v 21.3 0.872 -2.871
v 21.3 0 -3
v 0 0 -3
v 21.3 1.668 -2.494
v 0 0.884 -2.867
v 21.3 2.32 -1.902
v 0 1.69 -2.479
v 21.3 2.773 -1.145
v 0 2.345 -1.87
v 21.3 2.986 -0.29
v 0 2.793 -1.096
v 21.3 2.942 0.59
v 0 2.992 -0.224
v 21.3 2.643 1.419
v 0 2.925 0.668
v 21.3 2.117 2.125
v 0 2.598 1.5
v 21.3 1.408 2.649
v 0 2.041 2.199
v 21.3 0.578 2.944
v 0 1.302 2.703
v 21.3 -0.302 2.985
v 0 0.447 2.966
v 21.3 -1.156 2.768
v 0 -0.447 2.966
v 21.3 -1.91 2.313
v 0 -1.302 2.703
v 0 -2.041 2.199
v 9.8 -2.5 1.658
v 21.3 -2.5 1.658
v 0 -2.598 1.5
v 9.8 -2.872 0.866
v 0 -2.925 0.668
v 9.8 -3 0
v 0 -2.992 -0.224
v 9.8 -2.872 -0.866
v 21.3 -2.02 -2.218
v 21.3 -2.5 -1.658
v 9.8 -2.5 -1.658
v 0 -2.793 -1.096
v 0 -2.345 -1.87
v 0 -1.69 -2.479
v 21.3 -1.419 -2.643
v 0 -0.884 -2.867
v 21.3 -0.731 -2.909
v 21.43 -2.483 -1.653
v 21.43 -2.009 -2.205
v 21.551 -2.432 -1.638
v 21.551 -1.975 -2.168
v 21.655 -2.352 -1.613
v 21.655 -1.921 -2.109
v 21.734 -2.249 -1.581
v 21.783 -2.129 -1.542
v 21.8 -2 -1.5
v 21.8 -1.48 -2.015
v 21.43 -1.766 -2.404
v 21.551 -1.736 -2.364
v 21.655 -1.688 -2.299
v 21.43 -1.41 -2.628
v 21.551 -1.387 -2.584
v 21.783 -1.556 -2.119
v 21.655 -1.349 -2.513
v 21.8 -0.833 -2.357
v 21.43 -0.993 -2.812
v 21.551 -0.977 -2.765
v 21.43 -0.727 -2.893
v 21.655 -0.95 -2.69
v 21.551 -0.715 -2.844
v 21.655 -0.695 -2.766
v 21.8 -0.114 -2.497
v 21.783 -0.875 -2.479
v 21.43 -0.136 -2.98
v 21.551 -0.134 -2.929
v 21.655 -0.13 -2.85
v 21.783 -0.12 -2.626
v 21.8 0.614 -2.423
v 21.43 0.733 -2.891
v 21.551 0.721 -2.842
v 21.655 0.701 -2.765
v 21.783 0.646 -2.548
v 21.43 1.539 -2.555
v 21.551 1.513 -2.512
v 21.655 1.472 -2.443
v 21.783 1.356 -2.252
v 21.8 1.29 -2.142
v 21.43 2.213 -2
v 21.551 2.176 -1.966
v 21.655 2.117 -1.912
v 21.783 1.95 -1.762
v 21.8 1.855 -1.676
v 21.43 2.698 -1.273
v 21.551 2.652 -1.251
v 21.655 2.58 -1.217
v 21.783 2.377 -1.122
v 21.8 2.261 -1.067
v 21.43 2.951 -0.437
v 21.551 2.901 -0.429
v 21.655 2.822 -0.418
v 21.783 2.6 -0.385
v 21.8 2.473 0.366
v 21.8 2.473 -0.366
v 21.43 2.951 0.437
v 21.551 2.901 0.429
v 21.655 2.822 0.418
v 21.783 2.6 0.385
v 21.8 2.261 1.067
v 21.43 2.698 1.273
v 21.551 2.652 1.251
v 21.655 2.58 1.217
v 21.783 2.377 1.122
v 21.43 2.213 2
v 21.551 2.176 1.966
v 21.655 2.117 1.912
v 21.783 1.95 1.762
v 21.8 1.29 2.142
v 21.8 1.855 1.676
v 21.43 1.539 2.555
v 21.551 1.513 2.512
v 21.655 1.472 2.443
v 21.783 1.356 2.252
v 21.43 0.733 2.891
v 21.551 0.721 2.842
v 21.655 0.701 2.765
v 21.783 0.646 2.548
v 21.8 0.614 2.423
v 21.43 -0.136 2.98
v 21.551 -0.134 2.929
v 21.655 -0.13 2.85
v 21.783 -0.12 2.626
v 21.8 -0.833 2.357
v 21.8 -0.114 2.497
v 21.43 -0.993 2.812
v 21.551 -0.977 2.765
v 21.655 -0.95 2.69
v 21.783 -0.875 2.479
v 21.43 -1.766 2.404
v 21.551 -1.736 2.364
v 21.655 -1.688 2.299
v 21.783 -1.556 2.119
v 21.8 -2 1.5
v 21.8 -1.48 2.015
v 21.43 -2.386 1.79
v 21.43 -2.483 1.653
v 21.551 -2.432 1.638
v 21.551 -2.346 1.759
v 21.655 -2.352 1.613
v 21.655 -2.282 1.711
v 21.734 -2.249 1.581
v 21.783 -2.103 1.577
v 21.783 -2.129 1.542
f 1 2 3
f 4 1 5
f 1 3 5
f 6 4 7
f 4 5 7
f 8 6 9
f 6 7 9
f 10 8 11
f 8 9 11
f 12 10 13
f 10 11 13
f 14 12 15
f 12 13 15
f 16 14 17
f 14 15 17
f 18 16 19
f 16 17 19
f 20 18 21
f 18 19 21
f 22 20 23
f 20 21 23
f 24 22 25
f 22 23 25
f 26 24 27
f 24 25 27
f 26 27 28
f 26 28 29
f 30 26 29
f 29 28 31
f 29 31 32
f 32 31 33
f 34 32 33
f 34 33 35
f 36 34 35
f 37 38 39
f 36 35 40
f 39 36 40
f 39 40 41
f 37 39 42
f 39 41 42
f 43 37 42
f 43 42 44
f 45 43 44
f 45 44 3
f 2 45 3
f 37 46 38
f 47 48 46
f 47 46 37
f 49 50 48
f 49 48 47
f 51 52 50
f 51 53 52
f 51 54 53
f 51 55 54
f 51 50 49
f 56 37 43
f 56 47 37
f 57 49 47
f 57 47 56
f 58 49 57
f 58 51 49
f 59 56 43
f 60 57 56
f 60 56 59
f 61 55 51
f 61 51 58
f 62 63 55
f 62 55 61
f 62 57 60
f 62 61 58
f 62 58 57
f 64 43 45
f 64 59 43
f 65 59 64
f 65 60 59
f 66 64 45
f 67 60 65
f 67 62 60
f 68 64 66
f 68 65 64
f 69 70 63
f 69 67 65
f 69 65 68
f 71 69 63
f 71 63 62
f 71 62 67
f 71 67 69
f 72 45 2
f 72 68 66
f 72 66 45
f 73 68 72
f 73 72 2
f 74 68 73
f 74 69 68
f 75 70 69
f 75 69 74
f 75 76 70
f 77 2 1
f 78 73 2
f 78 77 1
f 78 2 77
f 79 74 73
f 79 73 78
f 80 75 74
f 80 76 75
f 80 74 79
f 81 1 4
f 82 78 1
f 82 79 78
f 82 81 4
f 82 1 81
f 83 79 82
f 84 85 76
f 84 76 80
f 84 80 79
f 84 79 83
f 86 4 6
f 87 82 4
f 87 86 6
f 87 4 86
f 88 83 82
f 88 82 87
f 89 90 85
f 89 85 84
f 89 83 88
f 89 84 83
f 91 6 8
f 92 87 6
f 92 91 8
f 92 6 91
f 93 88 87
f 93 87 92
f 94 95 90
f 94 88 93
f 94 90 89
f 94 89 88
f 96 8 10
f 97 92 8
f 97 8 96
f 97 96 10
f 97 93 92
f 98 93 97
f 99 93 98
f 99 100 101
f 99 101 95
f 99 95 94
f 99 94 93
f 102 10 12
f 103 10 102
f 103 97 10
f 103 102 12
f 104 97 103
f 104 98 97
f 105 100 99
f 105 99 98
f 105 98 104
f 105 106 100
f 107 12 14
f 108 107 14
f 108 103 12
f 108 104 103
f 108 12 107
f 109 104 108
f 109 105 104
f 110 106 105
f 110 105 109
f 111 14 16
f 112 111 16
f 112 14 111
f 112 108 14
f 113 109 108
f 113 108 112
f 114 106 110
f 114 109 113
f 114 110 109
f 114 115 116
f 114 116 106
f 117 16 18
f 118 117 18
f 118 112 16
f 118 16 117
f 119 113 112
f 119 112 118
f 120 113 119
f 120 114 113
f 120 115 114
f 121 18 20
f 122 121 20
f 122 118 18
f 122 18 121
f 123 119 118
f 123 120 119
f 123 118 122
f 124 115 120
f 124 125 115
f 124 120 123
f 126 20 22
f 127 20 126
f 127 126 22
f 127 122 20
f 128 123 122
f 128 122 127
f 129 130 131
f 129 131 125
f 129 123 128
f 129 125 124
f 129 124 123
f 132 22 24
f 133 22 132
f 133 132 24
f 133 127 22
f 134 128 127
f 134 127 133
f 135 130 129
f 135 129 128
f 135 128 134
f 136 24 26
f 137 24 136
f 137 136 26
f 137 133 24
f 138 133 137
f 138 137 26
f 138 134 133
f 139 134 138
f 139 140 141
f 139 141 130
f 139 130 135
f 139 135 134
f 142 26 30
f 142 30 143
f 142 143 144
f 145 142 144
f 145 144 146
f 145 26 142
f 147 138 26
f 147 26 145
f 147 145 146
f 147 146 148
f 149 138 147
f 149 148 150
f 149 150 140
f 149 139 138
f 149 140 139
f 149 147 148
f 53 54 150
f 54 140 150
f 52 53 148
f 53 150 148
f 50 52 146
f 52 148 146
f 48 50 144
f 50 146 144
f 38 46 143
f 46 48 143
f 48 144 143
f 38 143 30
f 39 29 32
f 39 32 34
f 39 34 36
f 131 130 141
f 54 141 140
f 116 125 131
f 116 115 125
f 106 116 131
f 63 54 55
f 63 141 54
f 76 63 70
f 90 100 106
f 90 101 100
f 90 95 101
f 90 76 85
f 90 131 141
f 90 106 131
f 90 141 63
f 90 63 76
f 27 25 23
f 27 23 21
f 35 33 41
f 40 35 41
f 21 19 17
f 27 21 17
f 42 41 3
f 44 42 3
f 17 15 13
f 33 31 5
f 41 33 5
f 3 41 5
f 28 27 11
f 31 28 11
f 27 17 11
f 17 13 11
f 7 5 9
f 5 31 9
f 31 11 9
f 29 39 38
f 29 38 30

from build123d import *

# Parameters (mm, degrees)
SKETCH1_R           = 3
BOSS_EXTRUDE1_DEPTH = 21.8
CUT_EXTRUDE2_START  = -12
CUT_EXTRUDE2_DEPTH  = 12
FILLET1_R           = 0.5


with BuildPart() as part:
    # Sketch1 → Boss-Extrude1 (new body)
    with BuildSketch(Plane(origin=(0, 0, 0), x_dir=(0, 0, -1), z_dir=(1, 0, 0))):
        Circle(SKETCH1_R)
    extrude(amount=BOSS_EXTRUDE1_DEPTH)

    # Sketch2 → Cut-Extrude2 (cut)
    with BuildSketch(Plane(origin=(21.8, 0, 0), x_dir=(0, 0, -1), z_dir=(1, 0, 0)).offset(CUT_EXTRUDE2_START)):
        with BuildLine():
            Line((0, -2.5), (-1.658312395, -2.5))
            ThreePointArc((-1.658312395, -2.5), (0, -3), (1.658312395, -2.5))
            Line((1.658312395, -2.5), (0, -2.5))
        make_face()
    extrude(amount=CUT_EXTRUDE2_DEPTH, mode=Mode.SUBTRACT)

    # Fillet1
    fillet1_edges = [part.edges().sort_by_distance(p)[0] for p in [
        (21.8, 2.643382037, 1.418637165),
        (21.8, -2.5, 0),
    ]]
    fillet(fillet1_edges, radius=FILLET1_R - 0.0001)  # a hair under: the kernel refuses the full size


solid = part.part
